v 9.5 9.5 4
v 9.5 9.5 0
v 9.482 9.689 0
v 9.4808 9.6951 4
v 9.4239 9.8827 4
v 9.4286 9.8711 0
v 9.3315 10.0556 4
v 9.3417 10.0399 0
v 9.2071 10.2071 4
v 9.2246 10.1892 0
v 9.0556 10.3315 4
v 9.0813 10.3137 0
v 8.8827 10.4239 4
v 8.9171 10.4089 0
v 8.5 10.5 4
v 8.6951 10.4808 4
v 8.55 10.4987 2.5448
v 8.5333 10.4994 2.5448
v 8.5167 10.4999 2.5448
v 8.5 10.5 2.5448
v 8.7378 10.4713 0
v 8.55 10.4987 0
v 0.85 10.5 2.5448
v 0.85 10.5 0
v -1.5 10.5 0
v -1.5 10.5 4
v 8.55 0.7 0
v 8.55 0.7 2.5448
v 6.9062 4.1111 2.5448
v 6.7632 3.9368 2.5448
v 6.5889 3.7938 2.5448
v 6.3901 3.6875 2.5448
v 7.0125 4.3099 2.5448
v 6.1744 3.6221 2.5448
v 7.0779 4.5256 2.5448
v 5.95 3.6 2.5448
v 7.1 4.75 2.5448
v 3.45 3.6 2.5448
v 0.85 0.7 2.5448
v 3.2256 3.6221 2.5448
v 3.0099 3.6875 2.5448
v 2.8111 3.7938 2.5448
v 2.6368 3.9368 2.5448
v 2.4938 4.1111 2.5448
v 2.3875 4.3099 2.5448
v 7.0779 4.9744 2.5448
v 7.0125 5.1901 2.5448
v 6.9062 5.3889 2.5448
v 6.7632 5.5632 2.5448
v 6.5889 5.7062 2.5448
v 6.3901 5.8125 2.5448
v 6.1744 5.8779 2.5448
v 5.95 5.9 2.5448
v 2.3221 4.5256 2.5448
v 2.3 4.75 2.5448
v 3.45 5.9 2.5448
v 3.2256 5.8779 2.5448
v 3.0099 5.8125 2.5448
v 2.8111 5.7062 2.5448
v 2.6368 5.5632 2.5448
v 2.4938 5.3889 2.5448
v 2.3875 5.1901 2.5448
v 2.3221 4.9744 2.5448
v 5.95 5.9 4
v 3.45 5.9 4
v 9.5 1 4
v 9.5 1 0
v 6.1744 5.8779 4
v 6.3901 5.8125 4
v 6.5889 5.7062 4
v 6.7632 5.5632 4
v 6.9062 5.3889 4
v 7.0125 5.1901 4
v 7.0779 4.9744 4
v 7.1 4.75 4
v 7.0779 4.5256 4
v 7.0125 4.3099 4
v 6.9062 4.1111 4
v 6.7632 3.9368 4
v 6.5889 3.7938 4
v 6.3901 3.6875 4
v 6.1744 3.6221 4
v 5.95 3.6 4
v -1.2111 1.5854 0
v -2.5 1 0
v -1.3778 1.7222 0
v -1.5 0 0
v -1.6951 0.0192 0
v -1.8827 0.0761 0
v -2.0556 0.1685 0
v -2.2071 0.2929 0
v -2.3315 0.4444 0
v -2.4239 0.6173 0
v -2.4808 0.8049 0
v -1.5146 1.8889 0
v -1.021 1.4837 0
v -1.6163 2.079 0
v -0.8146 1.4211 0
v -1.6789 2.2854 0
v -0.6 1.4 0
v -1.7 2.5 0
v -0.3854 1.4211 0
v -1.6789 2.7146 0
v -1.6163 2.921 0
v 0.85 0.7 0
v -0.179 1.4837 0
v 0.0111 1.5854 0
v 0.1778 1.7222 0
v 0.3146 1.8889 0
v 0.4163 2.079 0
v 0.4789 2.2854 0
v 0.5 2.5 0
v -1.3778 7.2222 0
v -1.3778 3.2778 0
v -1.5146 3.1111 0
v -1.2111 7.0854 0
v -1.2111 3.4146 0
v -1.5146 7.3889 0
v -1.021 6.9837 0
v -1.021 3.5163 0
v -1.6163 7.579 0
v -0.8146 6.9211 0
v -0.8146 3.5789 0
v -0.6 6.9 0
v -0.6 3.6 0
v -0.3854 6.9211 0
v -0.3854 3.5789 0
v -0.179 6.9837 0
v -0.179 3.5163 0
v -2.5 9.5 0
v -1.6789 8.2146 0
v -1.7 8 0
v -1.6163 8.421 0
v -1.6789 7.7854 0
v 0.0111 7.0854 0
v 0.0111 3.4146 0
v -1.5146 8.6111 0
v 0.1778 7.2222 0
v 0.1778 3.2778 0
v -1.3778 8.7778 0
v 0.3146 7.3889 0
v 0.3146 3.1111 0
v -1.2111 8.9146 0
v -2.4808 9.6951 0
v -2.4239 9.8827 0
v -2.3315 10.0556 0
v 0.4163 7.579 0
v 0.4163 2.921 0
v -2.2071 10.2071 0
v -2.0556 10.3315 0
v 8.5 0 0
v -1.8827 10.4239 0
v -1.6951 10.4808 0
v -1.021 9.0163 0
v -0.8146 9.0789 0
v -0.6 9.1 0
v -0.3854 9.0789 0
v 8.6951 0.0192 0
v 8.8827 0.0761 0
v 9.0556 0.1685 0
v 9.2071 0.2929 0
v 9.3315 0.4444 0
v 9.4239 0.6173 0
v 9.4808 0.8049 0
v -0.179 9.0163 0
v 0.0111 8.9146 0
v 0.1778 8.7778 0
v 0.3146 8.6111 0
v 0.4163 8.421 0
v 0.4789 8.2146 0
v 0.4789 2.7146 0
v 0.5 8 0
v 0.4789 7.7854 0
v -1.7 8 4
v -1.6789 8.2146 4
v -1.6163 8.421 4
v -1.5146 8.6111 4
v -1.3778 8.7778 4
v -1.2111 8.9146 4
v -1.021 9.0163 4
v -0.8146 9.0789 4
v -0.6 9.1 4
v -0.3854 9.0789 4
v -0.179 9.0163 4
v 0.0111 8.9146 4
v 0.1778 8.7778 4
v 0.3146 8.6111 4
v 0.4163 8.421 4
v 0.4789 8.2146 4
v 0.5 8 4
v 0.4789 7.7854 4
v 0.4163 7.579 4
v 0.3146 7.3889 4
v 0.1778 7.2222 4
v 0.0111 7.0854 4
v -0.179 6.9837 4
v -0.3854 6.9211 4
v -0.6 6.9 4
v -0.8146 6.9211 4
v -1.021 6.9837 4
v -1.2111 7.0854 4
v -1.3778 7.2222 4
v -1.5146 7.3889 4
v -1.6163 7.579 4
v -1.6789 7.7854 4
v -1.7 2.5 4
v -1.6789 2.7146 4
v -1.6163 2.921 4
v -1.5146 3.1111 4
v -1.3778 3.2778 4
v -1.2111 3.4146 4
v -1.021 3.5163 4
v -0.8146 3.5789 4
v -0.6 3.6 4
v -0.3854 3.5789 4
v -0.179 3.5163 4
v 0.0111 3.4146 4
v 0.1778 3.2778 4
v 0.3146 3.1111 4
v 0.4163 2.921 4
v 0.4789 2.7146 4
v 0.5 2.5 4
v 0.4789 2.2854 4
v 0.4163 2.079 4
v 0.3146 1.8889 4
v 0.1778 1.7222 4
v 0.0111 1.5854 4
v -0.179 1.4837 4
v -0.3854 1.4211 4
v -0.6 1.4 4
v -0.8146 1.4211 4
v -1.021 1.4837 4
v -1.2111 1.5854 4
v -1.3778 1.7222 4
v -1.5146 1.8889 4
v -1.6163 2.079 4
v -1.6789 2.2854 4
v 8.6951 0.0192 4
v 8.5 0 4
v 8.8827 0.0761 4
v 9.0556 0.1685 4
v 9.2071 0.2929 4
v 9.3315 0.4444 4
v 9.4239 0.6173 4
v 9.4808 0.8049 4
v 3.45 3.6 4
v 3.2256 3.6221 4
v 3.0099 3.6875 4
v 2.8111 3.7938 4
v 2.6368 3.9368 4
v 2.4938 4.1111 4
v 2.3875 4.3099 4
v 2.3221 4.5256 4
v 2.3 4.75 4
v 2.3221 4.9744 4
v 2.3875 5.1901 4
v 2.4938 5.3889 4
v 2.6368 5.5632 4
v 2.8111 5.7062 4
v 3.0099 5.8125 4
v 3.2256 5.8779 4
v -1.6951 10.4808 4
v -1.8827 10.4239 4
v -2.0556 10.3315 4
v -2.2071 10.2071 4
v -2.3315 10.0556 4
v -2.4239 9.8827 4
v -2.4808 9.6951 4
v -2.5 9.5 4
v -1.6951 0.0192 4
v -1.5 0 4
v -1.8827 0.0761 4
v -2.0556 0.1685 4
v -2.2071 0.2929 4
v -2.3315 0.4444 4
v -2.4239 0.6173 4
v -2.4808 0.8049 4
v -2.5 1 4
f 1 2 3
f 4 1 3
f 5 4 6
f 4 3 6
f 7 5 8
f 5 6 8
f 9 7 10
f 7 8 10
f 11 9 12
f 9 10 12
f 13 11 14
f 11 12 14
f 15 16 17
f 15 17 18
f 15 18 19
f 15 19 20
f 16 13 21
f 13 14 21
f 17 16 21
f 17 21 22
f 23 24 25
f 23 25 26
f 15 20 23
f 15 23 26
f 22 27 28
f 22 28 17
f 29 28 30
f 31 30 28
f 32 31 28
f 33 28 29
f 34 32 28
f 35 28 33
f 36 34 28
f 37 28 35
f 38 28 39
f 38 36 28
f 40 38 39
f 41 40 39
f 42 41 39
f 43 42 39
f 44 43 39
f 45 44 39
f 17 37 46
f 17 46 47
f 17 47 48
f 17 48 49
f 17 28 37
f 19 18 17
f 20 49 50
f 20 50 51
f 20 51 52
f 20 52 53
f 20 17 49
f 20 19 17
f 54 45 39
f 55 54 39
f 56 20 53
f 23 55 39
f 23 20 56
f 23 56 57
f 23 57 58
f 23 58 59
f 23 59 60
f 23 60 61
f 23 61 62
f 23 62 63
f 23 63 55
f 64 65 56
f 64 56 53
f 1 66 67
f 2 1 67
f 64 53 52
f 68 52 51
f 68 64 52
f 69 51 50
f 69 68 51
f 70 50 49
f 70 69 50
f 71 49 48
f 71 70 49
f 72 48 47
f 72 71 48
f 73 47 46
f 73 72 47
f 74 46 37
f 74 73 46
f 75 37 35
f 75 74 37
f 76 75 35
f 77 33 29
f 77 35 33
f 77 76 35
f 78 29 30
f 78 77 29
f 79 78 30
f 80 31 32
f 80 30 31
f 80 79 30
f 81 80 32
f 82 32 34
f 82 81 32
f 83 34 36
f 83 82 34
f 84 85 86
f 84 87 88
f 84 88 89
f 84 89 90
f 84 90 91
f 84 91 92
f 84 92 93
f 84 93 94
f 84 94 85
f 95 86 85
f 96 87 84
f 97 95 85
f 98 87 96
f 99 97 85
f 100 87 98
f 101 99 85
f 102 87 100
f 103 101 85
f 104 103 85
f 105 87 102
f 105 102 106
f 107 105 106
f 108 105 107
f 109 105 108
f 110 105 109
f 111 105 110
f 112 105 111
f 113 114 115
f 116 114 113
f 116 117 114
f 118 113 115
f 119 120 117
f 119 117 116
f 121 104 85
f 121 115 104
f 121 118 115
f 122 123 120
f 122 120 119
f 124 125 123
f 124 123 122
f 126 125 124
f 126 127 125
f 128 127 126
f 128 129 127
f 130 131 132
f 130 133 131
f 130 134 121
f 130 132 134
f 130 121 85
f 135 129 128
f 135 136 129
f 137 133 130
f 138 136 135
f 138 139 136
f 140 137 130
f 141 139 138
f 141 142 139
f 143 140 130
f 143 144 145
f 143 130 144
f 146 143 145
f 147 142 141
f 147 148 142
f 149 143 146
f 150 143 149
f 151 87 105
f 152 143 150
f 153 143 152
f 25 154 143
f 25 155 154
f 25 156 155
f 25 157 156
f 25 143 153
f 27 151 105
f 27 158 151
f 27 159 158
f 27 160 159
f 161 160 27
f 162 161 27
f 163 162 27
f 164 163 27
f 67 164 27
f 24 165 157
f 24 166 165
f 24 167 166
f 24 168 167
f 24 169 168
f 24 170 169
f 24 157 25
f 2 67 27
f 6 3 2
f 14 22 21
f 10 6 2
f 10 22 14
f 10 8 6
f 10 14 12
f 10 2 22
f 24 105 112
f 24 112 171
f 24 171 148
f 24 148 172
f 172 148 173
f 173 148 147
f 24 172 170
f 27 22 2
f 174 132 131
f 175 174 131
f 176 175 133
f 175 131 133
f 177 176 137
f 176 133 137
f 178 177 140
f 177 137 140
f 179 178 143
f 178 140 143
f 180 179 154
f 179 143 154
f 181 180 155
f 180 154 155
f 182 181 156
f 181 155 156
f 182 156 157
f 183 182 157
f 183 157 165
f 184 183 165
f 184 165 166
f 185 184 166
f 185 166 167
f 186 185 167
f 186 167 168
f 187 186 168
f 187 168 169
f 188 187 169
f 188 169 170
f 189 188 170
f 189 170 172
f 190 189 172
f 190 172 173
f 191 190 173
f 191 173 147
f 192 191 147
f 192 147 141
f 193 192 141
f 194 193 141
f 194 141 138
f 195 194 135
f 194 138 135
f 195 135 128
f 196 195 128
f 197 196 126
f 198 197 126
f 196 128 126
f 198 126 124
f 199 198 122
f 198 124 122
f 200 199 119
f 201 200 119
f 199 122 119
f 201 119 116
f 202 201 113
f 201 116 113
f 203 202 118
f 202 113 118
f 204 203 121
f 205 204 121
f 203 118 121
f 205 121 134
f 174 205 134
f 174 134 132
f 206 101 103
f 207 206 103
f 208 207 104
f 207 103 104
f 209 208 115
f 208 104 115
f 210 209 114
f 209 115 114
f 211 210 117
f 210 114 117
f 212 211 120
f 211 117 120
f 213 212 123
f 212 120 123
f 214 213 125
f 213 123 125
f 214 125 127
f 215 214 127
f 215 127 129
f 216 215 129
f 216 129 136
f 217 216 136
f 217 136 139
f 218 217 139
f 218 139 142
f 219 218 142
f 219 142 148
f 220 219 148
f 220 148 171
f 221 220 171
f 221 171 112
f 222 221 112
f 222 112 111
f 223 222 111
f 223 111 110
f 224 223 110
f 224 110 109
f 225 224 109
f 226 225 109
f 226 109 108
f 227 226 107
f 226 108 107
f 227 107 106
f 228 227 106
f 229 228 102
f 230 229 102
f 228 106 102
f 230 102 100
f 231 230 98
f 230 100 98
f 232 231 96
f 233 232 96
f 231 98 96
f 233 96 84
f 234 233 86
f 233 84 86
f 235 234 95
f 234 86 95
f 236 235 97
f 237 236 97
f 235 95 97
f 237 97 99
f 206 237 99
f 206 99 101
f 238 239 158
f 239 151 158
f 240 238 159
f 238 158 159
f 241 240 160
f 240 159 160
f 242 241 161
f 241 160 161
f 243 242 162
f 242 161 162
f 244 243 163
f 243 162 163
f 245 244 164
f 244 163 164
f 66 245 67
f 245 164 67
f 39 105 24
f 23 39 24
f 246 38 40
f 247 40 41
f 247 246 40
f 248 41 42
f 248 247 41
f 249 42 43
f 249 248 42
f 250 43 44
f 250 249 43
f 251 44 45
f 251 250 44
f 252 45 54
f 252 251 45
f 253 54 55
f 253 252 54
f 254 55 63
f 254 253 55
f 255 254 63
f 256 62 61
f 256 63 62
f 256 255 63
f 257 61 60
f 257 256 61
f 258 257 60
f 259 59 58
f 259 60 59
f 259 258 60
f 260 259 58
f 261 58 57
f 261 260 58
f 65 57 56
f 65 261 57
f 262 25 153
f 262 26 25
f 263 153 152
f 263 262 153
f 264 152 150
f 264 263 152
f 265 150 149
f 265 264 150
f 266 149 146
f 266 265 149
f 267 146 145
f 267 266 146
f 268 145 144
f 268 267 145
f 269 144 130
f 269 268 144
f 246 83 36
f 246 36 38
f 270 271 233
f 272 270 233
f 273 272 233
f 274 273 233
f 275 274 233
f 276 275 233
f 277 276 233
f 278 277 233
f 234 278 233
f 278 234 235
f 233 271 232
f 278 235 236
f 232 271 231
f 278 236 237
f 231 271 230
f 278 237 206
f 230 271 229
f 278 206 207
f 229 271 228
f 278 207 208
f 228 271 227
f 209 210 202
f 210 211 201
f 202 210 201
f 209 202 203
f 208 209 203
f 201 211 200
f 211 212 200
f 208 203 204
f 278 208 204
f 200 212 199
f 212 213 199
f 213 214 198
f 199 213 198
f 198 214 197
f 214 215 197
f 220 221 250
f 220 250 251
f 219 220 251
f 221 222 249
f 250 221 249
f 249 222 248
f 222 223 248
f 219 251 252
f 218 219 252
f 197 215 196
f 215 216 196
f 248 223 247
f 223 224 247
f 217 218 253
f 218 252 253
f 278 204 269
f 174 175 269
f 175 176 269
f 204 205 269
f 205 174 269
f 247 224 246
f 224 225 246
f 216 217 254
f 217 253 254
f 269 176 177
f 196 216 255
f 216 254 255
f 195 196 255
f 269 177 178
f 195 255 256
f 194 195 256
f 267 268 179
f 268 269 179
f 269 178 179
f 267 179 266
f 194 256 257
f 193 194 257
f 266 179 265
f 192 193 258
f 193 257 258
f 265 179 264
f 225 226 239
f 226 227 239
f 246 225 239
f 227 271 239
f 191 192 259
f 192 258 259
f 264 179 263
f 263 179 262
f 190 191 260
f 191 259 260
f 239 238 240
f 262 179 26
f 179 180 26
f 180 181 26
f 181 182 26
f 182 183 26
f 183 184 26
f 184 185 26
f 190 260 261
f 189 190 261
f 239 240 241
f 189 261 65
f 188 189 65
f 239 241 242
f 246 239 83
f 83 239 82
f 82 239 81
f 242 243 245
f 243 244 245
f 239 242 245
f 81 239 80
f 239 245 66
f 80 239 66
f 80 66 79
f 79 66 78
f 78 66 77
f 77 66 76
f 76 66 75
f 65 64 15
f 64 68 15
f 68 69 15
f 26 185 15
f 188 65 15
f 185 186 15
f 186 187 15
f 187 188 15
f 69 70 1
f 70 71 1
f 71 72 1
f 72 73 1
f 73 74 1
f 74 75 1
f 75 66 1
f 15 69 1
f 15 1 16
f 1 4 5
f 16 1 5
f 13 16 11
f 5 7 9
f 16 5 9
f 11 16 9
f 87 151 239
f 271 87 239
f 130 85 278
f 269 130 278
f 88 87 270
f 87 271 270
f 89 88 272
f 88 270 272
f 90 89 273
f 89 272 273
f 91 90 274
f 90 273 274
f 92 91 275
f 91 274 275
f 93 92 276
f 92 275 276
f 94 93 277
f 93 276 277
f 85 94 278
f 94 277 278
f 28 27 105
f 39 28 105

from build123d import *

# Parameters (mm, degrees)
SKETCH1_W              = 9.5
SKETCH1_H              = 4
BOSS_EXTRUDE1_DEPTH    = 10.5
BREAKBEAM_HOLE_1_DEPTH = 9.5
SKETCH5_W              = 4
SKETCH5_H              = 10.5
BOSS_EXTRUDE4_DEPTH    = 2.5
FILLET1_R              = 1
M2_CLEARANCE_HOLE_D    = 2.2
SKETCH15_W             = 7.7
SKETCH15_H             = 10.1
SKETCH15_W_2           = 7.1
SKETCH15_H_2           = 9.5
CUT_EXTRUDE5_DEPTH     = 2.544836551
CUT_EXTRUDE6_DEPTH     = 1.46


with BuildPart() as part:
    # Sketch1 → Boss-Extrude1 (new body)
    with BuildSketch(Plane(origin=(0, 0, 0), x_dir=(1, 0, 0), z_dir=(0, 1, 0))):
        with Locations((4.75, -2)):
            Rectangle(SKETCH1_W, SKETCH1_H)
    extrude(amount=BOSS_EXTRUDE1_DEPTH)

    # Sketch2 → Breakbeam Hole 1 (cut)
    with BuildSketch(Plane(origin=(0, 10.5, 0), x_dir=(1, 0, 0), z_dir=(0, 1, 0))):
        Polygon((8.25, -2.544836551), (8.25, -1.5), (8.25, 0), (1.15, 0), (1.15, -1.5), (1.15, -2.544836551), align=None)
    extrude(amount=-BREAKBEAM_HOLE_1_DEPTH, mode=Mode.SUBTRACT)

    # Sketch5 → Boss-Extrude4 (add)
    with BuildSketch(Plane.ZY):
        with Locations((2, 5.25)):
            Rectangle(SKETCH5_W, SKETCH5_H)
    extrude(amount=BOSS_EXTRUDE4_DEPTH)

    # Fillet1
    fillet1_edges = [part.edges().sort_by_distance(p)[0] for p in [
        (9.5, 10.5, 2),
        (-2.5, 0, 2),
        (-2.5, 10.5, 2),
        (9.5, 0, 2),
    ]]
    fillet(fillet1_edges, radius=FILLET1_R)

    # M2 Clearance Hole (through all)
    with Locations(Plane.XY.offset(4)):
        with Locations((-0.6, 8), (-0.6, 2.5)):
            Hole(M2_CLEARANCE_HOLE_D / 2)

    # Sketch15 → Cut-Extrude5 (cut)
    with BuildSketch(Plane(origin=(0, 0, 0), x_dir=(-1, 0, 0), z_dir=(0, 0, -1))):
        with Locations((-4.7, 5.75)):
            Rectangle(SKETCH15_W, SKETCH15_H)
        with Locations((-4.7, 5.75)):
            Rectangle(SKETCH15_W_2, SKETCH15_H_2, mode=Mode.SUBTRACT)
    extrude(amount=-CUT_EXTRUDE5_DEPTH, mode=Mode.SUBTRACT)

    # Sketch16 → Cut-Extrude6 (cut)
    with BuildSketch(Plane.XY.offset(4)):
        with BuildLine():
            Line((3.45, 5.9), (5.95, 5.9))
            ThreePointArc((5.95, 5.9), (7.1, 4.75), (5.95, 3.6))
            Line((5.95, 3.6), (3.45, 3.6))
            ThreePointArc((3.45, 3.6), (2.3, 4.75), (3.45, 5.9))
        make_face()
    extrude(amount=-CUT_EXTRUDE6_DEPTH, mode=Mode.SUBTRACT)


solid = part.part
